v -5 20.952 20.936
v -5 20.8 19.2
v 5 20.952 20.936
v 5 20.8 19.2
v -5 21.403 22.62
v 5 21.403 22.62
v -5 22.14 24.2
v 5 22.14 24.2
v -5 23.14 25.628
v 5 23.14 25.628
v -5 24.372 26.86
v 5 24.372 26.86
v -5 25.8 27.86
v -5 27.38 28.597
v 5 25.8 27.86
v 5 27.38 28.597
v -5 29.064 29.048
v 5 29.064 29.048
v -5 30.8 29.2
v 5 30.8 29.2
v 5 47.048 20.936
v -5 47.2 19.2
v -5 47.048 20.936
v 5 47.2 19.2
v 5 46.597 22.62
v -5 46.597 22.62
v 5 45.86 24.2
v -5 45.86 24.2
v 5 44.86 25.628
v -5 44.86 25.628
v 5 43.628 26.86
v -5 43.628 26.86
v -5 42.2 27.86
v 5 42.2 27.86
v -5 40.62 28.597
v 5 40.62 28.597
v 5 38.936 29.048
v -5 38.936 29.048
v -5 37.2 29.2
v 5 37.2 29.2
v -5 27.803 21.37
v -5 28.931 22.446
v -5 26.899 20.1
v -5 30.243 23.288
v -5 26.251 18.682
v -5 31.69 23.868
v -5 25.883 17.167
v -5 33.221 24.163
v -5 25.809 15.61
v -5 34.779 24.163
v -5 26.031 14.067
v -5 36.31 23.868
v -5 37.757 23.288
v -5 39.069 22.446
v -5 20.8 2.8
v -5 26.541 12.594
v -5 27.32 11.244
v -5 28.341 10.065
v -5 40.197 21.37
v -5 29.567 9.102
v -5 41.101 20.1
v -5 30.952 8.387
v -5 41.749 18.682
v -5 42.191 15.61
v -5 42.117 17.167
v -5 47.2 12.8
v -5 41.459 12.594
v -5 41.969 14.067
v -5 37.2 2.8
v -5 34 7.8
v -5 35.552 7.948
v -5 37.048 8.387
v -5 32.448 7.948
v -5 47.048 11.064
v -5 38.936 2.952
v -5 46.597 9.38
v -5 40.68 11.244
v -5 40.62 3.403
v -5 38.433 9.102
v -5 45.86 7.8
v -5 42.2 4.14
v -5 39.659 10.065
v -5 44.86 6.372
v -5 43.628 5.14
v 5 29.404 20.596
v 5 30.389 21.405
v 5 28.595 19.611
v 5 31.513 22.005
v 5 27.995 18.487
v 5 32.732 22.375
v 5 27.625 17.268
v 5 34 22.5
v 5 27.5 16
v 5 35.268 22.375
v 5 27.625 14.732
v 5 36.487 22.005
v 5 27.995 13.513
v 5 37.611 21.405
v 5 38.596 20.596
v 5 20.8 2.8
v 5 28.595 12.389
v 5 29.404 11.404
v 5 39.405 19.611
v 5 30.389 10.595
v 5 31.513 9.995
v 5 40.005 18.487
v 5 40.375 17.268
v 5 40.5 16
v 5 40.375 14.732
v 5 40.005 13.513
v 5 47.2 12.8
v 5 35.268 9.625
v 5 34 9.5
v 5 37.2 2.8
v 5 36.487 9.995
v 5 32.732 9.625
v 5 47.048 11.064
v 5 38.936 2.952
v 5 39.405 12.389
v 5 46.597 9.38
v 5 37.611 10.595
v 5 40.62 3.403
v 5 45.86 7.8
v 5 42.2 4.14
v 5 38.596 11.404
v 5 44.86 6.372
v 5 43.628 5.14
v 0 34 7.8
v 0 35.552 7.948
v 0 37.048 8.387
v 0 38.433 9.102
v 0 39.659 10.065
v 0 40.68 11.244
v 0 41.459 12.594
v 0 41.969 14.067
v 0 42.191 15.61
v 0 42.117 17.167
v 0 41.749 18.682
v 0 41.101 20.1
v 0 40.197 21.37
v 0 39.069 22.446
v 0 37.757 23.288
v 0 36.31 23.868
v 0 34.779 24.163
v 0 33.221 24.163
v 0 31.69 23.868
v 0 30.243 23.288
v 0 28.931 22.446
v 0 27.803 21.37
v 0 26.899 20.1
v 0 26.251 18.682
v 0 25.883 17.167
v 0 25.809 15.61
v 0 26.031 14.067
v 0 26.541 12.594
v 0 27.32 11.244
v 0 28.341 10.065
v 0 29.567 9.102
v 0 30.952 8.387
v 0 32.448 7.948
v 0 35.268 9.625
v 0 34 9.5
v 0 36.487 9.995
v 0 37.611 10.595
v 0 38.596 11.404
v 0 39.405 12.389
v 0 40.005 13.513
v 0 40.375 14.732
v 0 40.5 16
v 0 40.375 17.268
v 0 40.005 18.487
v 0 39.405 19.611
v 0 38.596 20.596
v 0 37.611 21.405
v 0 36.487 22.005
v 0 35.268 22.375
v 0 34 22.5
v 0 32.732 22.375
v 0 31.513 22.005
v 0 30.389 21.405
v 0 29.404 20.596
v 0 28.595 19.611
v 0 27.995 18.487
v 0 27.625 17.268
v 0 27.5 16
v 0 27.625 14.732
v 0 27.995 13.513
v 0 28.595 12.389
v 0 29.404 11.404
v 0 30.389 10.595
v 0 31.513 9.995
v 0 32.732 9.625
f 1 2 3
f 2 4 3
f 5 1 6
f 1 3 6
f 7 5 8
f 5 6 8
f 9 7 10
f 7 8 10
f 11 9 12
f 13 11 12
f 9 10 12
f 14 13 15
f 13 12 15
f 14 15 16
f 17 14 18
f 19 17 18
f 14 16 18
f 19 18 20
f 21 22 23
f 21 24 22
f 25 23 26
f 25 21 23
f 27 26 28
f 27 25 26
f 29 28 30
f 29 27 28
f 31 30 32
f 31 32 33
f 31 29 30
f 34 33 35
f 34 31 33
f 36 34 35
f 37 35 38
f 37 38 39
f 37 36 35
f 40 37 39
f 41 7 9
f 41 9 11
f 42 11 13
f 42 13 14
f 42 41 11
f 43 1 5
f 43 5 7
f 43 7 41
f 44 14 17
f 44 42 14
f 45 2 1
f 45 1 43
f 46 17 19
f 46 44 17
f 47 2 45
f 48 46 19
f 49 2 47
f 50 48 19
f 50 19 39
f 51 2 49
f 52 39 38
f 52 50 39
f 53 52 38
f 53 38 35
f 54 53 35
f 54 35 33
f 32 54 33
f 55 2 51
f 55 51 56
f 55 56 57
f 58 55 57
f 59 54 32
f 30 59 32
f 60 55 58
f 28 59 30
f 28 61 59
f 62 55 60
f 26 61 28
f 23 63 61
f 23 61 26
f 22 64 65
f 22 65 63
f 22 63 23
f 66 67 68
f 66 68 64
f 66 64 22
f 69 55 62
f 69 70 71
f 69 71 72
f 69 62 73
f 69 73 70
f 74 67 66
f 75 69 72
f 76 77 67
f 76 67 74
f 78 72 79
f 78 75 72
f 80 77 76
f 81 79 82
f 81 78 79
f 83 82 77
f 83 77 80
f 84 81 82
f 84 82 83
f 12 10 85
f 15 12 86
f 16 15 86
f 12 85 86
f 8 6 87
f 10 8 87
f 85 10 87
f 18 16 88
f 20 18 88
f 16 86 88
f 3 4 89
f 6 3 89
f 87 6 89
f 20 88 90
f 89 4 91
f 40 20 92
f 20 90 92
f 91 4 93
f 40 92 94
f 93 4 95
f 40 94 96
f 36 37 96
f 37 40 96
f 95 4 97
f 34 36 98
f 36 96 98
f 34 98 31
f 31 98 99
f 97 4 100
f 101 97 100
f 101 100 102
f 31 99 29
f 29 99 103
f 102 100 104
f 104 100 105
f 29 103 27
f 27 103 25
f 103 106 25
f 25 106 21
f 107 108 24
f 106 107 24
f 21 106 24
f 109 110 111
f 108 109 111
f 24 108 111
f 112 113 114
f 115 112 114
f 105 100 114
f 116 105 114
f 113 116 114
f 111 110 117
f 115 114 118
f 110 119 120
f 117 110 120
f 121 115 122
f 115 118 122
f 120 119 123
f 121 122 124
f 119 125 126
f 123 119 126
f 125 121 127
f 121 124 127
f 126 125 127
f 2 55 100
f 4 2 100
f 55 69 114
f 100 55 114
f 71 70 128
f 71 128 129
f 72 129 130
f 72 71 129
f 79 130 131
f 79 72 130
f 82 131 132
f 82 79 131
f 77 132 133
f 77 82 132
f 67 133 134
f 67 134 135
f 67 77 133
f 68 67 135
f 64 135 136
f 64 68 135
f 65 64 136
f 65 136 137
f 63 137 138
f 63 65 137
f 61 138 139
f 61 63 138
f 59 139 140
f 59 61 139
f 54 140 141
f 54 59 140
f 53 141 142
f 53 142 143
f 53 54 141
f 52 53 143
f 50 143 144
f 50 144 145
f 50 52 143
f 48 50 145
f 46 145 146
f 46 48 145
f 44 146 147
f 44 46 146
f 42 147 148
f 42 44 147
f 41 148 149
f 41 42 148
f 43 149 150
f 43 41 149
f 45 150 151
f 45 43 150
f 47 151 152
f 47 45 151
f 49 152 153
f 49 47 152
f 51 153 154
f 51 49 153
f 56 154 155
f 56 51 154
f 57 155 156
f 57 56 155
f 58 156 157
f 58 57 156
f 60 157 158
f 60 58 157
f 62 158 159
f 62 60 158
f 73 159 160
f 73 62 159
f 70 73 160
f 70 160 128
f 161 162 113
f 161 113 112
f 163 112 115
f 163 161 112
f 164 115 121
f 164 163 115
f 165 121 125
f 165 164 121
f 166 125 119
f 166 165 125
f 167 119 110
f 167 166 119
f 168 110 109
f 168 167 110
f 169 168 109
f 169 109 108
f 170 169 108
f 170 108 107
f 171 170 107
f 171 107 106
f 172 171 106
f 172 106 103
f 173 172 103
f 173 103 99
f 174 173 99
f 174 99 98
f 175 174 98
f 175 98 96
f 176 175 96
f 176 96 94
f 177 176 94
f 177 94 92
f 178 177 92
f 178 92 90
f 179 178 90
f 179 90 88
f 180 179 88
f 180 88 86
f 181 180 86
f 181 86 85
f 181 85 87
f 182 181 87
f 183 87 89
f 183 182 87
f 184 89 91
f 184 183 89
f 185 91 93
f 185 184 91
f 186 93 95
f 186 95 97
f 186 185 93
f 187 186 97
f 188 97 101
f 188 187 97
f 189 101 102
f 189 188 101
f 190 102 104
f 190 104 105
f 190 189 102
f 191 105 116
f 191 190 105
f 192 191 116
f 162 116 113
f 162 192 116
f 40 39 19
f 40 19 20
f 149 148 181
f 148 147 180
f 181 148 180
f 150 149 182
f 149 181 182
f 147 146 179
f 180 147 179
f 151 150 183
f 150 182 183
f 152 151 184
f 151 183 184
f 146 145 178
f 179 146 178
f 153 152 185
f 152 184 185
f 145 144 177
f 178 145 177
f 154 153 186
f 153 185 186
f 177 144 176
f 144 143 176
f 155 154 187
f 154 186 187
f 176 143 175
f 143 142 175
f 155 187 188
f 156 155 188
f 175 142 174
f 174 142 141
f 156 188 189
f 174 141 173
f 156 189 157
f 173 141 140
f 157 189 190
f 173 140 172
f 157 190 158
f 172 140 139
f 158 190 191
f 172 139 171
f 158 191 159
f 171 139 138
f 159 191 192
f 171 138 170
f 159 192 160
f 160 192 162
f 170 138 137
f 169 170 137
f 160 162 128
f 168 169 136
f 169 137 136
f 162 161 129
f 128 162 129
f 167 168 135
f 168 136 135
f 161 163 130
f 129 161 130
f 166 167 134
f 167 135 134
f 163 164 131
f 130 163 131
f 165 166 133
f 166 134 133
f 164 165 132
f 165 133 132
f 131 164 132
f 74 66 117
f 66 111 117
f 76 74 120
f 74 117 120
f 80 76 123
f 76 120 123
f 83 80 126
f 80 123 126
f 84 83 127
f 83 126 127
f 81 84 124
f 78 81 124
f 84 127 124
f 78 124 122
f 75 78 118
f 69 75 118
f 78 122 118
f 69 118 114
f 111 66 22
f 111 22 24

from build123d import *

# Parameters (mm, degrees)
CYLINDER005_R     = 6.5
CYLINDER005_DEPTH = 10
CYLINDER004_R     = 8.2
CYLINDER004_DEPTH = 5
BOX_W             = 10
BOX_H             = 26.4
BOX_DEPTH         = 26.4
FILLET_R          = 10


with BuildPart() as bring_holder_hole:
    # Cylinder005 → Cylinder005 (new body)
    with BuildSketch(Plane(origin=(0, 0, 0), x_dir=(0, 0, -1), z_dir=(1, 0, 0))):
        Circle(CYLINDER005_R)
    extrude(amount=CYLINDER005_DEPTH)


with BuildPart() as bring_holder_extract:
    # Cylinder004 → Cylinder004 (new body)
    with BuildSketch(Plane(origin=(0, 0, 0), x_dir=(0, 0, -1), z_dir=(1, 0, 0))):
        Circle(CYLINDER004_R)
    extrude(amount=CYLINDER004_DEPTH)

    # Fusion001: union bring holder hole
    add(bring_holder_hole.part)


with BuildPart() as bring_holder_cut_clone:
    # Box → Box (new body)
    with BuildSketch(Plane(origin=(0, -13.2, -13.2), x_dir=(1, 0, 0), z_dir=(0, 0, 1))):
        with Locations((5, 13.2)):
            Rectangle(BOX_W, BOX_H)
    extrude(amount=BOX_DEPTH)

    # Fillet
    fillet_edges = [bring_holder_cut_clone.edges().sort_by_distance(p)[0] for p in [
        (5, -13.2, 13.2),
        (5, 13.2, -13.2),
        (5, 13.2, 13.2),
    ]]
    fillet(fillet_edges, radius=FILLET_R)

    # Cut023015003: cut bring holder extract
    add(bring_holder_extract.part, mode=Mode.SUBTRACT)


with BuildPart() as bring_holder_cut_clone_1:
    # Cut023015003 placement: moved
    add(bring_holder_cut_clone.part.moved(Location((-5, 26, 13.2))))


with BuildPart() as bring_holder_cut_clone_2:
    # Clone002 placement: moved
    add(bring_holder_cut_clone_1.part.moved(Location((0, 0, -6.2))))


with BuildPart() as bring_holder_cut_clone_3:
    # Body003 placement: moved
    add(bring_holder_cut_clone_2.part.moved(Location((0, 8, 9))))


solid = bring_holder_cut_clone_3.part
